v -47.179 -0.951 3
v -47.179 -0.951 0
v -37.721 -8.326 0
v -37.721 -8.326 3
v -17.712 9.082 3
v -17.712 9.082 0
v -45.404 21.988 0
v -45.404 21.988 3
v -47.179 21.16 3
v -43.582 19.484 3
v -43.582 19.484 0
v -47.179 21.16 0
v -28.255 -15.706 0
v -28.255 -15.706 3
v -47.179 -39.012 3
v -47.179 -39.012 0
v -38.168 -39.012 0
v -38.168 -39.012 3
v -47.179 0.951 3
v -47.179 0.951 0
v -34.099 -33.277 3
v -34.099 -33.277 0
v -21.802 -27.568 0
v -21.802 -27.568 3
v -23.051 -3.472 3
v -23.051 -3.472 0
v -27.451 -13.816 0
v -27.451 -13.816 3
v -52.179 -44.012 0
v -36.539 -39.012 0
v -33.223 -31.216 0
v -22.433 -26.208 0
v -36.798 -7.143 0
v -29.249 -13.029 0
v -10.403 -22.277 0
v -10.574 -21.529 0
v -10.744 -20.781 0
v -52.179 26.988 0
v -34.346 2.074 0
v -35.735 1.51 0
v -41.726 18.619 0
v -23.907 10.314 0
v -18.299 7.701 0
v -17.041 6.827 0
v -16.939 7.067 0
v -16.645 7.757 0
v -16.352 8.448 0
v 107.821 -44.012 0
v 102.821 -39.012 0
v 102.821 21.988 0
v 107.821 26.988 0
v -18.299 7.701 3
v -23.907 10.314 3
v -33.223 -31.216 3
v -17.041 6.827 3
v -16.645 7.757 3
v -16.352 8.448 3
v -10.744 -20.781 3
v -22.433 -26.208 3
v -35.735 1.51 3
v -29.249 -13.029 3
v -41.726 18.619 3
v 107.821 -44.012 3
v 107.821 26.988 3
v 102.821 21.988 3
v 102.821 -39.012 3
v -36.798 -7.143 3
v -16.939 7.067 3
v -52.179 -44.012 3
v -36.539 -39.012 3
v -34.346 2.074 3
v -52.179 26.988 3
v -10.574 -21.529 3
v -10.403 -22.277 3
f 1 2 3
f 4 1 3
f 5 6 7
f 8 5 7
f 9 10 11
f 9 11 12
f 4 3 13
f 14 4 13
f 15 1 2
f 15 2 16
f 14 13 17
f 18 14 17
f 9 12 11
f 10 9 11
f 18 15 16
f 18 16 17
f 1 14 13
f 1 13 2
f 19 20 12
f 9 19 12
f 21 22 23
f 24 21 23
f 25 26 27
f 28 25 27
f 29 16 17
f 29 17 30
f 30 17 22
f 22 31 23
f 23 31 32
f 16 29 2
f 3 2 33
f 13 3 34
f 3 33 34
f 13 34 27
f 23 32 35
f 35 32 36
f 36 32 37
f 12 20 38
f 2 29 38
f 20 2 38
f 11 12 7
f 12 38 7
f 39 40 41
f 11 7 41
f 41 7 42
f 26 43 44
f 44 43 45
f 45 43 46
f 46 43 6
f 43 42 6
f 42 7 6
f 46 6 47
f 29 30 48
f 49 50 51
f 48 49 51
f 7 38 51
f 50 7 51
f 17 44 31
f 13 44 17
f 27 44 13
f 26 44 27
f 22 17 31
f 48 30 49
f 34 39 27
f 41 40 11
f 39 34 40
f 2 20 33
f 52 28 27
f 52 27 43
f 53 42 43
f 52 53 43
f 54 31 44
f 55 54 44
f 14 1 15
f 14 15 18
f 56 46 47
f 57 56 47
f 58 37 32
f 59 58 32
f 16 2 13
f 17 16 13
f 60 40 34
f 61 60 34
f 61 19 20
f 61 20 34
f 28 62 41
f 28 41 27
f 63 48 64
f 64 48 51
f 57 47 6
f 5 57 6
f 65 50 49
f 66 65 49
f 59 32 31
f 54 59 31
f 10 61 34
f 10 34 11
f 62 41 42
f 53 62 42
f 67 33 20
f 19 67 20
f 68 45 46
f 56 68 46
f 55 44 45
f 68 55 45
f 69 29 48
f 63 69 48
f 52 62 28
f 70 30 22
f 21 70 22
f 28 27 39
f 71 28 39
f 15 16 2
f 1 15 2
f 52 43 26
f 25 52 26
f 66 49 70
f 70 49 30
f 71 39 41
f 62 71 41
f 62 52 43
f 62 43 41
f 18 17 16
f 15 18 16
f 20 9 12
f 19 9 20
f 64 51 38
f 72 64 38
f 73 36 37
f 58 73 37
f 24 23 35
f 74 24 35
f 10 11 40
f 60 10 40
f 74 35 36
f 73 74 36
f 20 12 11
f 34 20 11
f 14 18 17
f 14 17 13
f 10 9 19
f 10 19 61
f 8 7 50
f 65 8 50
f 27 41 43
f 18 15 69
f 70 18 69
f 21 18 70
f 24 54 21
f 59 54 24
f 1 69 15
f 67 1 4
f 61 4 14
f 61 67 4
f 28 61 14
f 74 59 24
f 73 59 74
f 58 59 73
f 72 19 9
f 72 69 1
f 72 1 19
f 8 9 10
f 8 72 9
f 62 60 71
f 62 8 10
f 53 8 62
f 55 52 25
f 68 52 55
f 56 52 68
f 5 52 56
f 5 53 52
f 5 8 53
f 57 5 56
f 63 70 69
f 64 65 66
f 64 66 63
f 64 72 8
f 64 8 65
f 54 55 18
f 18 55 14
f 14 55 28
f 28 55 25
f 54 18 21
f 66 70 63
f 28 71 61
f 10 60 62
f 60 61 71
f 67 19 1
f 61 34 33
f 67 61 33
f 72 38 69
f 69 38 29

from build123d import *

# Parameters (mm, degrees)
F0_W     = 5
F0_H     = 5
F1_DEPTH = 3
F3_DEPTH = 3


with BuildPart() as f1:
    # F0 (on Top) → F1 (new body)
    with BuildSketch(Plane.XY):
        Polygon((-45.4040056488, 21.9877450019), (-47.1794794431, 21.9877450019), (-23.5897397215, 10.993872501), (-23.2729228799, 11.6736718014), align=None)
        Polygon((-23.5897397215, 10.993872501), (-47.1794794431, 21.9877450019), (-47.1794794431, 21.1602949006), (-43.5824141612, 19.4839017927), (-42.7601054315, 19.1006691908), (-41.7257321146, 18.618605018), (-23.9065565632, 10.3140732006), align=None)
        Polygon((-41.7257321146, 18.618605018), (-42.7601054315, 19.1006691908), (-35.0499012319, 1.8158922844), (-34.345795602, 2.0742239744), align=None)
        Polygon((-42.7601054315, 19.1006691908), (-43.5824141612, 19.4839017927), (-35.7348462755, 1.5103594921), (-35.0499012319, 1.8158922844), align=None)
        Polygon((-23.2729228799, 11.6736718014), (-23.5897397215, 10.993872501), (-18.0053610902, 8.3913025958), (-17.7116326841, 9.0818621386), align=None)
        Polygon((-18.0053610902, 8.3913025958), (-23.5897397215, 10.993872501), (-23.9065565632, 10.3140732006), (-18.2990894963, 7.700743053), align=None)
        Polygon((-17.7116326841, 9.0818621386), (-18.0053610902, 8.3913025958), (-17.3255617898, 8.0744857541), (-16.6453705191, 7.7574862368), (-16.351642113, 8.4480457795), align=None)
        Polygon((-17.3255617898, 8.0744857541), (-18.0053610902, 8.3913025958), (-18.2990894963, 7.700743053), (-17.6192901959, 7.3839262113), align=None)
        Polygon((-16.6453705191, 7.7574862368), (-17.3255617898, 8.0744857541), (-17.1143889358, 7.1486196694), (-16.9390989252, 7.066926694), align=None)
        Polygon((-17.1143889358, 7.1486196694), (-17.3255617898, 8.0744857541), (-17.6192901959, 7.3839262113), align=None)
        Polygon((-17.0410746172, 6.8271804325), (-17.1143889358, 7.1486196694), (-17.6192901959, 7.3839262113), (-22.3714190216, -3.7883943447), (-21.681257424, -4.0819534855), align=None)
        Polygon((-17.6192901959, 7.3839262113), (-18.2990894963, 7.700743053), (-23.051218322, -3.471577503), (-22.3714190216, -3.7883943447), align=None)
        Polygon((-16.9390989252, 7.066926694), (-17.1143889358, 7.1486196694), (-17.0410746172, 6.8271804325), align=None)
        Polygon((-27.3396970322, -15.468884622), (-37.3538322747, -39.0122549981), (-36.5388057622, -39.0122549981), (-34.0993712739, -33.2771107969), (-33.6611290686, -32.2467973145), (-33.2228868633, -31.2164838322), (-21.681257424, -4.0819534855), (-22.3714190216, -3.7883943447), (-27.0359227228, -14.7547070217), align=None)
        Polygon((-22.3714190216, -3.7883943447), (-23.051218322, -3.471577503), (-27.4510842105, -13.8157230242), (-27.6476172037, -14.2777748078), (-27.0359227228, -14.7547070217), align=None)
        Polygon((-34.345795602, 2.0742239744), (-35.0499012319, 1.8158922844), (-27.9901434053, -14.010710473), (-27.6476172037, -14.2777748078), (-27.4510842105, -13.8157230242), align=None)
        Polygon((-35.0499012319, 1.8158922844), (-35.7348462755, 1.5103594921), (-29.2493098322, -13.0289507049), (-27.9901434053, -14.010710473), align=None)
        Polygon((-36.7984283085, -7.1429767416), (-47.1794794431, 0.9510274632), (-47.1794794431, 0), (-37.2595882377, -7.734442311), align=None)
        Polygon((-47.1794794431, 0), (-47.1794794431, -0.9510274632), (-37.7207481668, -8.3259078804), (-37.2595882377, -7.734442311), align=None)
        Polygon((-29.2493098322, -13.0289507049), (-36.7984283085, -7.1429767416), (-37.2595882377, -7.734442311), (-27.9513915131, -14.9919524081), (-27.7566597577, -14.5341353596), (-27.9901434053, -14.010710473), align=None)
        Polygon((-37.2595882377, -7.734442311), (-37.7207481668, -8.3259078804), (-28.2551658225, -15.7061300084), (-27.9513915131, -14.9919524081), align=None)
        Polygon((-33.6611290686, -32.2467973145), (-34.0993712739, -33.2771107969), (-21.8015368152, -27.568214313), (-22.1173333259, -26.8879404242), align=None)
        Polygon((-33.2228868633, -31.2164838322), (-33.6611290686, -32.2467973145), (-22.1173333259, -26.8879404242), (-22.4331298367, -26.2076665354), align=None)
        Polygon((-10.5735375832, -21.5290835338), (-10.7440753935, -20.781377701), (-22.4331298367, -26.2076665354), (-22.1173333259, -26.8879404242), align=None)
        Polygon((-22.1173333259, -26.8879404242), (-21.8015368152, -27.568214313), (-10.402999773, -22.2767893666), (-10.5735375832, -21.5290835338), align=None)
        Polygon((-27.7566597577, -14.5341353596), (-27.3396970322, -15.468884622), (-27.0359227228, -14.7547070217), (-27.6476172037, -14.2777748078), align=None)
        Polygon((-27.9513915131, -14.9919524081), (-27.3396970322, -15.468884622), (-27.7566597577, -14.5341353596), align=None)
        Polygon((-28.2551658225, -15.7061300084), (-38.1683891161, -39.0122549981), (-37.3538322747, -39.0122549981), (-27.3396970322, -15.468884622), (-27.9513915131, -14.9919524081), align=None)
        Polygon((-27.9901434053, -14.010710473), (-27.7566597577, -14.5341353596), (-27.6476172037, -14.2777748078), align=None)
        Polygon((-38.1683891161, -39.0122549981), (-47.1794794431, -39.0122549981), (-47.1794794431, -44.0122549981), (27.8205205569, -44.0122549981), (102.8205205569, -44.0122549981), (102.8205205569, -39.0122549981), (96.8116257564, -39.0122549981), (64.2124563456, -39.0122549981), (42.8673438728, -39.0122549981), (-8.5564870387, -39.0122549981), (-36.5388057622, -39.0122549981), (-37.3538322747, -39.0122549981), align=None)
        with Locations((-49.6794794431, 24.4877450019)):
            Rectangle(F0_W, F0_H)
        Polygon((-47.1794794431, 21.9877450019), (-52.1794794431, 21.9877450019), (-52.1794794431, -39.0122549981), (-47.1794794431, -39.0122549981), (-47.1794794431, -0.9510274632), (-47.1794794431, 0), (-47.1794794431, 0.9510274632), (-47.1794794431, 21.1602949006), align=None)
        with Locations((-49.6794794431, -41.5122549981)):
            Rectangle(F0_W, F0_H)
        Polygon((102.8205205569, 26.9877450019), (-47.1794794431, 26.9877450019), (-47.1794794431, 21.9877450019), (-45.4040056488, 21.9877450019), (-2.1254387614, 21.9877450019), (0, 21.9877450019), (11.2784197554, 21.9877450019), (31.8888692592, 21.9877450019), (63.347607851, 21.9877450019), (95.1727256179, 21.9877450019), (102.8205205569, 21.9877450019), align=None)
        with Locations((105.3205205569, 24.4877450019)):
            Rectangle(F0_W, F0_H)
        Polygon((107.8205205569, -39.0122549981), (107.8205205569, 21.9877450019), (102.8205205569, 21.9877450019), (102.8205205569, -20.5286494456), (102.8205205569, -28.1625539064), (102.8205205569, -39.0122549981), align=None)
        with Locations((105.3205205569, -41.5122549981)):
            Rectangle(F0_W, F0_H)
    extrude(amount=F1_DEPTH)


with BuildPart() as f3:
    # F2 (on face) → F3 (new body)
    with BuildSketch(Plane.XY.offset(3)):
        Polygon((-18.2990894963, 7.700743053), (-41.7257321146, 18.618605018), (-27.4510842105, -13.8157230242), align=None)
    extrude(amount=-F3_DEPTH)


with BuildPart() as f3b:
    # F2 (on face) → F3, piece 2 (new body)
    with BuildSketch(Plane.XY.offset(3)):
        Polygon((-29.2493098322, -13.0289507049), (-43.5824141612, 19.4839017927), (-47.1794794431, 21.1602949006), (-47.1794794431, 0.9510274632), align=None)
    extrude(amount=-F3_DEPTH)


with BuildPart() as f3c:
    # F2 (on face) → F3, piece 3 (new body)
    with BuildSketch(Plane.XY.offset(3)):
        Polygon((-38.1683891161, -39.0122549981), (-28.2551658225, -15.7061300084), (-47.1794794431, -0.9510274632), (-47.1794794431, -39.0122549981), align=None)
    extrude(amount=-F3_DEPTH)


solid = Compound([f1.part, f3.part, f3b.part, f3c.part])
